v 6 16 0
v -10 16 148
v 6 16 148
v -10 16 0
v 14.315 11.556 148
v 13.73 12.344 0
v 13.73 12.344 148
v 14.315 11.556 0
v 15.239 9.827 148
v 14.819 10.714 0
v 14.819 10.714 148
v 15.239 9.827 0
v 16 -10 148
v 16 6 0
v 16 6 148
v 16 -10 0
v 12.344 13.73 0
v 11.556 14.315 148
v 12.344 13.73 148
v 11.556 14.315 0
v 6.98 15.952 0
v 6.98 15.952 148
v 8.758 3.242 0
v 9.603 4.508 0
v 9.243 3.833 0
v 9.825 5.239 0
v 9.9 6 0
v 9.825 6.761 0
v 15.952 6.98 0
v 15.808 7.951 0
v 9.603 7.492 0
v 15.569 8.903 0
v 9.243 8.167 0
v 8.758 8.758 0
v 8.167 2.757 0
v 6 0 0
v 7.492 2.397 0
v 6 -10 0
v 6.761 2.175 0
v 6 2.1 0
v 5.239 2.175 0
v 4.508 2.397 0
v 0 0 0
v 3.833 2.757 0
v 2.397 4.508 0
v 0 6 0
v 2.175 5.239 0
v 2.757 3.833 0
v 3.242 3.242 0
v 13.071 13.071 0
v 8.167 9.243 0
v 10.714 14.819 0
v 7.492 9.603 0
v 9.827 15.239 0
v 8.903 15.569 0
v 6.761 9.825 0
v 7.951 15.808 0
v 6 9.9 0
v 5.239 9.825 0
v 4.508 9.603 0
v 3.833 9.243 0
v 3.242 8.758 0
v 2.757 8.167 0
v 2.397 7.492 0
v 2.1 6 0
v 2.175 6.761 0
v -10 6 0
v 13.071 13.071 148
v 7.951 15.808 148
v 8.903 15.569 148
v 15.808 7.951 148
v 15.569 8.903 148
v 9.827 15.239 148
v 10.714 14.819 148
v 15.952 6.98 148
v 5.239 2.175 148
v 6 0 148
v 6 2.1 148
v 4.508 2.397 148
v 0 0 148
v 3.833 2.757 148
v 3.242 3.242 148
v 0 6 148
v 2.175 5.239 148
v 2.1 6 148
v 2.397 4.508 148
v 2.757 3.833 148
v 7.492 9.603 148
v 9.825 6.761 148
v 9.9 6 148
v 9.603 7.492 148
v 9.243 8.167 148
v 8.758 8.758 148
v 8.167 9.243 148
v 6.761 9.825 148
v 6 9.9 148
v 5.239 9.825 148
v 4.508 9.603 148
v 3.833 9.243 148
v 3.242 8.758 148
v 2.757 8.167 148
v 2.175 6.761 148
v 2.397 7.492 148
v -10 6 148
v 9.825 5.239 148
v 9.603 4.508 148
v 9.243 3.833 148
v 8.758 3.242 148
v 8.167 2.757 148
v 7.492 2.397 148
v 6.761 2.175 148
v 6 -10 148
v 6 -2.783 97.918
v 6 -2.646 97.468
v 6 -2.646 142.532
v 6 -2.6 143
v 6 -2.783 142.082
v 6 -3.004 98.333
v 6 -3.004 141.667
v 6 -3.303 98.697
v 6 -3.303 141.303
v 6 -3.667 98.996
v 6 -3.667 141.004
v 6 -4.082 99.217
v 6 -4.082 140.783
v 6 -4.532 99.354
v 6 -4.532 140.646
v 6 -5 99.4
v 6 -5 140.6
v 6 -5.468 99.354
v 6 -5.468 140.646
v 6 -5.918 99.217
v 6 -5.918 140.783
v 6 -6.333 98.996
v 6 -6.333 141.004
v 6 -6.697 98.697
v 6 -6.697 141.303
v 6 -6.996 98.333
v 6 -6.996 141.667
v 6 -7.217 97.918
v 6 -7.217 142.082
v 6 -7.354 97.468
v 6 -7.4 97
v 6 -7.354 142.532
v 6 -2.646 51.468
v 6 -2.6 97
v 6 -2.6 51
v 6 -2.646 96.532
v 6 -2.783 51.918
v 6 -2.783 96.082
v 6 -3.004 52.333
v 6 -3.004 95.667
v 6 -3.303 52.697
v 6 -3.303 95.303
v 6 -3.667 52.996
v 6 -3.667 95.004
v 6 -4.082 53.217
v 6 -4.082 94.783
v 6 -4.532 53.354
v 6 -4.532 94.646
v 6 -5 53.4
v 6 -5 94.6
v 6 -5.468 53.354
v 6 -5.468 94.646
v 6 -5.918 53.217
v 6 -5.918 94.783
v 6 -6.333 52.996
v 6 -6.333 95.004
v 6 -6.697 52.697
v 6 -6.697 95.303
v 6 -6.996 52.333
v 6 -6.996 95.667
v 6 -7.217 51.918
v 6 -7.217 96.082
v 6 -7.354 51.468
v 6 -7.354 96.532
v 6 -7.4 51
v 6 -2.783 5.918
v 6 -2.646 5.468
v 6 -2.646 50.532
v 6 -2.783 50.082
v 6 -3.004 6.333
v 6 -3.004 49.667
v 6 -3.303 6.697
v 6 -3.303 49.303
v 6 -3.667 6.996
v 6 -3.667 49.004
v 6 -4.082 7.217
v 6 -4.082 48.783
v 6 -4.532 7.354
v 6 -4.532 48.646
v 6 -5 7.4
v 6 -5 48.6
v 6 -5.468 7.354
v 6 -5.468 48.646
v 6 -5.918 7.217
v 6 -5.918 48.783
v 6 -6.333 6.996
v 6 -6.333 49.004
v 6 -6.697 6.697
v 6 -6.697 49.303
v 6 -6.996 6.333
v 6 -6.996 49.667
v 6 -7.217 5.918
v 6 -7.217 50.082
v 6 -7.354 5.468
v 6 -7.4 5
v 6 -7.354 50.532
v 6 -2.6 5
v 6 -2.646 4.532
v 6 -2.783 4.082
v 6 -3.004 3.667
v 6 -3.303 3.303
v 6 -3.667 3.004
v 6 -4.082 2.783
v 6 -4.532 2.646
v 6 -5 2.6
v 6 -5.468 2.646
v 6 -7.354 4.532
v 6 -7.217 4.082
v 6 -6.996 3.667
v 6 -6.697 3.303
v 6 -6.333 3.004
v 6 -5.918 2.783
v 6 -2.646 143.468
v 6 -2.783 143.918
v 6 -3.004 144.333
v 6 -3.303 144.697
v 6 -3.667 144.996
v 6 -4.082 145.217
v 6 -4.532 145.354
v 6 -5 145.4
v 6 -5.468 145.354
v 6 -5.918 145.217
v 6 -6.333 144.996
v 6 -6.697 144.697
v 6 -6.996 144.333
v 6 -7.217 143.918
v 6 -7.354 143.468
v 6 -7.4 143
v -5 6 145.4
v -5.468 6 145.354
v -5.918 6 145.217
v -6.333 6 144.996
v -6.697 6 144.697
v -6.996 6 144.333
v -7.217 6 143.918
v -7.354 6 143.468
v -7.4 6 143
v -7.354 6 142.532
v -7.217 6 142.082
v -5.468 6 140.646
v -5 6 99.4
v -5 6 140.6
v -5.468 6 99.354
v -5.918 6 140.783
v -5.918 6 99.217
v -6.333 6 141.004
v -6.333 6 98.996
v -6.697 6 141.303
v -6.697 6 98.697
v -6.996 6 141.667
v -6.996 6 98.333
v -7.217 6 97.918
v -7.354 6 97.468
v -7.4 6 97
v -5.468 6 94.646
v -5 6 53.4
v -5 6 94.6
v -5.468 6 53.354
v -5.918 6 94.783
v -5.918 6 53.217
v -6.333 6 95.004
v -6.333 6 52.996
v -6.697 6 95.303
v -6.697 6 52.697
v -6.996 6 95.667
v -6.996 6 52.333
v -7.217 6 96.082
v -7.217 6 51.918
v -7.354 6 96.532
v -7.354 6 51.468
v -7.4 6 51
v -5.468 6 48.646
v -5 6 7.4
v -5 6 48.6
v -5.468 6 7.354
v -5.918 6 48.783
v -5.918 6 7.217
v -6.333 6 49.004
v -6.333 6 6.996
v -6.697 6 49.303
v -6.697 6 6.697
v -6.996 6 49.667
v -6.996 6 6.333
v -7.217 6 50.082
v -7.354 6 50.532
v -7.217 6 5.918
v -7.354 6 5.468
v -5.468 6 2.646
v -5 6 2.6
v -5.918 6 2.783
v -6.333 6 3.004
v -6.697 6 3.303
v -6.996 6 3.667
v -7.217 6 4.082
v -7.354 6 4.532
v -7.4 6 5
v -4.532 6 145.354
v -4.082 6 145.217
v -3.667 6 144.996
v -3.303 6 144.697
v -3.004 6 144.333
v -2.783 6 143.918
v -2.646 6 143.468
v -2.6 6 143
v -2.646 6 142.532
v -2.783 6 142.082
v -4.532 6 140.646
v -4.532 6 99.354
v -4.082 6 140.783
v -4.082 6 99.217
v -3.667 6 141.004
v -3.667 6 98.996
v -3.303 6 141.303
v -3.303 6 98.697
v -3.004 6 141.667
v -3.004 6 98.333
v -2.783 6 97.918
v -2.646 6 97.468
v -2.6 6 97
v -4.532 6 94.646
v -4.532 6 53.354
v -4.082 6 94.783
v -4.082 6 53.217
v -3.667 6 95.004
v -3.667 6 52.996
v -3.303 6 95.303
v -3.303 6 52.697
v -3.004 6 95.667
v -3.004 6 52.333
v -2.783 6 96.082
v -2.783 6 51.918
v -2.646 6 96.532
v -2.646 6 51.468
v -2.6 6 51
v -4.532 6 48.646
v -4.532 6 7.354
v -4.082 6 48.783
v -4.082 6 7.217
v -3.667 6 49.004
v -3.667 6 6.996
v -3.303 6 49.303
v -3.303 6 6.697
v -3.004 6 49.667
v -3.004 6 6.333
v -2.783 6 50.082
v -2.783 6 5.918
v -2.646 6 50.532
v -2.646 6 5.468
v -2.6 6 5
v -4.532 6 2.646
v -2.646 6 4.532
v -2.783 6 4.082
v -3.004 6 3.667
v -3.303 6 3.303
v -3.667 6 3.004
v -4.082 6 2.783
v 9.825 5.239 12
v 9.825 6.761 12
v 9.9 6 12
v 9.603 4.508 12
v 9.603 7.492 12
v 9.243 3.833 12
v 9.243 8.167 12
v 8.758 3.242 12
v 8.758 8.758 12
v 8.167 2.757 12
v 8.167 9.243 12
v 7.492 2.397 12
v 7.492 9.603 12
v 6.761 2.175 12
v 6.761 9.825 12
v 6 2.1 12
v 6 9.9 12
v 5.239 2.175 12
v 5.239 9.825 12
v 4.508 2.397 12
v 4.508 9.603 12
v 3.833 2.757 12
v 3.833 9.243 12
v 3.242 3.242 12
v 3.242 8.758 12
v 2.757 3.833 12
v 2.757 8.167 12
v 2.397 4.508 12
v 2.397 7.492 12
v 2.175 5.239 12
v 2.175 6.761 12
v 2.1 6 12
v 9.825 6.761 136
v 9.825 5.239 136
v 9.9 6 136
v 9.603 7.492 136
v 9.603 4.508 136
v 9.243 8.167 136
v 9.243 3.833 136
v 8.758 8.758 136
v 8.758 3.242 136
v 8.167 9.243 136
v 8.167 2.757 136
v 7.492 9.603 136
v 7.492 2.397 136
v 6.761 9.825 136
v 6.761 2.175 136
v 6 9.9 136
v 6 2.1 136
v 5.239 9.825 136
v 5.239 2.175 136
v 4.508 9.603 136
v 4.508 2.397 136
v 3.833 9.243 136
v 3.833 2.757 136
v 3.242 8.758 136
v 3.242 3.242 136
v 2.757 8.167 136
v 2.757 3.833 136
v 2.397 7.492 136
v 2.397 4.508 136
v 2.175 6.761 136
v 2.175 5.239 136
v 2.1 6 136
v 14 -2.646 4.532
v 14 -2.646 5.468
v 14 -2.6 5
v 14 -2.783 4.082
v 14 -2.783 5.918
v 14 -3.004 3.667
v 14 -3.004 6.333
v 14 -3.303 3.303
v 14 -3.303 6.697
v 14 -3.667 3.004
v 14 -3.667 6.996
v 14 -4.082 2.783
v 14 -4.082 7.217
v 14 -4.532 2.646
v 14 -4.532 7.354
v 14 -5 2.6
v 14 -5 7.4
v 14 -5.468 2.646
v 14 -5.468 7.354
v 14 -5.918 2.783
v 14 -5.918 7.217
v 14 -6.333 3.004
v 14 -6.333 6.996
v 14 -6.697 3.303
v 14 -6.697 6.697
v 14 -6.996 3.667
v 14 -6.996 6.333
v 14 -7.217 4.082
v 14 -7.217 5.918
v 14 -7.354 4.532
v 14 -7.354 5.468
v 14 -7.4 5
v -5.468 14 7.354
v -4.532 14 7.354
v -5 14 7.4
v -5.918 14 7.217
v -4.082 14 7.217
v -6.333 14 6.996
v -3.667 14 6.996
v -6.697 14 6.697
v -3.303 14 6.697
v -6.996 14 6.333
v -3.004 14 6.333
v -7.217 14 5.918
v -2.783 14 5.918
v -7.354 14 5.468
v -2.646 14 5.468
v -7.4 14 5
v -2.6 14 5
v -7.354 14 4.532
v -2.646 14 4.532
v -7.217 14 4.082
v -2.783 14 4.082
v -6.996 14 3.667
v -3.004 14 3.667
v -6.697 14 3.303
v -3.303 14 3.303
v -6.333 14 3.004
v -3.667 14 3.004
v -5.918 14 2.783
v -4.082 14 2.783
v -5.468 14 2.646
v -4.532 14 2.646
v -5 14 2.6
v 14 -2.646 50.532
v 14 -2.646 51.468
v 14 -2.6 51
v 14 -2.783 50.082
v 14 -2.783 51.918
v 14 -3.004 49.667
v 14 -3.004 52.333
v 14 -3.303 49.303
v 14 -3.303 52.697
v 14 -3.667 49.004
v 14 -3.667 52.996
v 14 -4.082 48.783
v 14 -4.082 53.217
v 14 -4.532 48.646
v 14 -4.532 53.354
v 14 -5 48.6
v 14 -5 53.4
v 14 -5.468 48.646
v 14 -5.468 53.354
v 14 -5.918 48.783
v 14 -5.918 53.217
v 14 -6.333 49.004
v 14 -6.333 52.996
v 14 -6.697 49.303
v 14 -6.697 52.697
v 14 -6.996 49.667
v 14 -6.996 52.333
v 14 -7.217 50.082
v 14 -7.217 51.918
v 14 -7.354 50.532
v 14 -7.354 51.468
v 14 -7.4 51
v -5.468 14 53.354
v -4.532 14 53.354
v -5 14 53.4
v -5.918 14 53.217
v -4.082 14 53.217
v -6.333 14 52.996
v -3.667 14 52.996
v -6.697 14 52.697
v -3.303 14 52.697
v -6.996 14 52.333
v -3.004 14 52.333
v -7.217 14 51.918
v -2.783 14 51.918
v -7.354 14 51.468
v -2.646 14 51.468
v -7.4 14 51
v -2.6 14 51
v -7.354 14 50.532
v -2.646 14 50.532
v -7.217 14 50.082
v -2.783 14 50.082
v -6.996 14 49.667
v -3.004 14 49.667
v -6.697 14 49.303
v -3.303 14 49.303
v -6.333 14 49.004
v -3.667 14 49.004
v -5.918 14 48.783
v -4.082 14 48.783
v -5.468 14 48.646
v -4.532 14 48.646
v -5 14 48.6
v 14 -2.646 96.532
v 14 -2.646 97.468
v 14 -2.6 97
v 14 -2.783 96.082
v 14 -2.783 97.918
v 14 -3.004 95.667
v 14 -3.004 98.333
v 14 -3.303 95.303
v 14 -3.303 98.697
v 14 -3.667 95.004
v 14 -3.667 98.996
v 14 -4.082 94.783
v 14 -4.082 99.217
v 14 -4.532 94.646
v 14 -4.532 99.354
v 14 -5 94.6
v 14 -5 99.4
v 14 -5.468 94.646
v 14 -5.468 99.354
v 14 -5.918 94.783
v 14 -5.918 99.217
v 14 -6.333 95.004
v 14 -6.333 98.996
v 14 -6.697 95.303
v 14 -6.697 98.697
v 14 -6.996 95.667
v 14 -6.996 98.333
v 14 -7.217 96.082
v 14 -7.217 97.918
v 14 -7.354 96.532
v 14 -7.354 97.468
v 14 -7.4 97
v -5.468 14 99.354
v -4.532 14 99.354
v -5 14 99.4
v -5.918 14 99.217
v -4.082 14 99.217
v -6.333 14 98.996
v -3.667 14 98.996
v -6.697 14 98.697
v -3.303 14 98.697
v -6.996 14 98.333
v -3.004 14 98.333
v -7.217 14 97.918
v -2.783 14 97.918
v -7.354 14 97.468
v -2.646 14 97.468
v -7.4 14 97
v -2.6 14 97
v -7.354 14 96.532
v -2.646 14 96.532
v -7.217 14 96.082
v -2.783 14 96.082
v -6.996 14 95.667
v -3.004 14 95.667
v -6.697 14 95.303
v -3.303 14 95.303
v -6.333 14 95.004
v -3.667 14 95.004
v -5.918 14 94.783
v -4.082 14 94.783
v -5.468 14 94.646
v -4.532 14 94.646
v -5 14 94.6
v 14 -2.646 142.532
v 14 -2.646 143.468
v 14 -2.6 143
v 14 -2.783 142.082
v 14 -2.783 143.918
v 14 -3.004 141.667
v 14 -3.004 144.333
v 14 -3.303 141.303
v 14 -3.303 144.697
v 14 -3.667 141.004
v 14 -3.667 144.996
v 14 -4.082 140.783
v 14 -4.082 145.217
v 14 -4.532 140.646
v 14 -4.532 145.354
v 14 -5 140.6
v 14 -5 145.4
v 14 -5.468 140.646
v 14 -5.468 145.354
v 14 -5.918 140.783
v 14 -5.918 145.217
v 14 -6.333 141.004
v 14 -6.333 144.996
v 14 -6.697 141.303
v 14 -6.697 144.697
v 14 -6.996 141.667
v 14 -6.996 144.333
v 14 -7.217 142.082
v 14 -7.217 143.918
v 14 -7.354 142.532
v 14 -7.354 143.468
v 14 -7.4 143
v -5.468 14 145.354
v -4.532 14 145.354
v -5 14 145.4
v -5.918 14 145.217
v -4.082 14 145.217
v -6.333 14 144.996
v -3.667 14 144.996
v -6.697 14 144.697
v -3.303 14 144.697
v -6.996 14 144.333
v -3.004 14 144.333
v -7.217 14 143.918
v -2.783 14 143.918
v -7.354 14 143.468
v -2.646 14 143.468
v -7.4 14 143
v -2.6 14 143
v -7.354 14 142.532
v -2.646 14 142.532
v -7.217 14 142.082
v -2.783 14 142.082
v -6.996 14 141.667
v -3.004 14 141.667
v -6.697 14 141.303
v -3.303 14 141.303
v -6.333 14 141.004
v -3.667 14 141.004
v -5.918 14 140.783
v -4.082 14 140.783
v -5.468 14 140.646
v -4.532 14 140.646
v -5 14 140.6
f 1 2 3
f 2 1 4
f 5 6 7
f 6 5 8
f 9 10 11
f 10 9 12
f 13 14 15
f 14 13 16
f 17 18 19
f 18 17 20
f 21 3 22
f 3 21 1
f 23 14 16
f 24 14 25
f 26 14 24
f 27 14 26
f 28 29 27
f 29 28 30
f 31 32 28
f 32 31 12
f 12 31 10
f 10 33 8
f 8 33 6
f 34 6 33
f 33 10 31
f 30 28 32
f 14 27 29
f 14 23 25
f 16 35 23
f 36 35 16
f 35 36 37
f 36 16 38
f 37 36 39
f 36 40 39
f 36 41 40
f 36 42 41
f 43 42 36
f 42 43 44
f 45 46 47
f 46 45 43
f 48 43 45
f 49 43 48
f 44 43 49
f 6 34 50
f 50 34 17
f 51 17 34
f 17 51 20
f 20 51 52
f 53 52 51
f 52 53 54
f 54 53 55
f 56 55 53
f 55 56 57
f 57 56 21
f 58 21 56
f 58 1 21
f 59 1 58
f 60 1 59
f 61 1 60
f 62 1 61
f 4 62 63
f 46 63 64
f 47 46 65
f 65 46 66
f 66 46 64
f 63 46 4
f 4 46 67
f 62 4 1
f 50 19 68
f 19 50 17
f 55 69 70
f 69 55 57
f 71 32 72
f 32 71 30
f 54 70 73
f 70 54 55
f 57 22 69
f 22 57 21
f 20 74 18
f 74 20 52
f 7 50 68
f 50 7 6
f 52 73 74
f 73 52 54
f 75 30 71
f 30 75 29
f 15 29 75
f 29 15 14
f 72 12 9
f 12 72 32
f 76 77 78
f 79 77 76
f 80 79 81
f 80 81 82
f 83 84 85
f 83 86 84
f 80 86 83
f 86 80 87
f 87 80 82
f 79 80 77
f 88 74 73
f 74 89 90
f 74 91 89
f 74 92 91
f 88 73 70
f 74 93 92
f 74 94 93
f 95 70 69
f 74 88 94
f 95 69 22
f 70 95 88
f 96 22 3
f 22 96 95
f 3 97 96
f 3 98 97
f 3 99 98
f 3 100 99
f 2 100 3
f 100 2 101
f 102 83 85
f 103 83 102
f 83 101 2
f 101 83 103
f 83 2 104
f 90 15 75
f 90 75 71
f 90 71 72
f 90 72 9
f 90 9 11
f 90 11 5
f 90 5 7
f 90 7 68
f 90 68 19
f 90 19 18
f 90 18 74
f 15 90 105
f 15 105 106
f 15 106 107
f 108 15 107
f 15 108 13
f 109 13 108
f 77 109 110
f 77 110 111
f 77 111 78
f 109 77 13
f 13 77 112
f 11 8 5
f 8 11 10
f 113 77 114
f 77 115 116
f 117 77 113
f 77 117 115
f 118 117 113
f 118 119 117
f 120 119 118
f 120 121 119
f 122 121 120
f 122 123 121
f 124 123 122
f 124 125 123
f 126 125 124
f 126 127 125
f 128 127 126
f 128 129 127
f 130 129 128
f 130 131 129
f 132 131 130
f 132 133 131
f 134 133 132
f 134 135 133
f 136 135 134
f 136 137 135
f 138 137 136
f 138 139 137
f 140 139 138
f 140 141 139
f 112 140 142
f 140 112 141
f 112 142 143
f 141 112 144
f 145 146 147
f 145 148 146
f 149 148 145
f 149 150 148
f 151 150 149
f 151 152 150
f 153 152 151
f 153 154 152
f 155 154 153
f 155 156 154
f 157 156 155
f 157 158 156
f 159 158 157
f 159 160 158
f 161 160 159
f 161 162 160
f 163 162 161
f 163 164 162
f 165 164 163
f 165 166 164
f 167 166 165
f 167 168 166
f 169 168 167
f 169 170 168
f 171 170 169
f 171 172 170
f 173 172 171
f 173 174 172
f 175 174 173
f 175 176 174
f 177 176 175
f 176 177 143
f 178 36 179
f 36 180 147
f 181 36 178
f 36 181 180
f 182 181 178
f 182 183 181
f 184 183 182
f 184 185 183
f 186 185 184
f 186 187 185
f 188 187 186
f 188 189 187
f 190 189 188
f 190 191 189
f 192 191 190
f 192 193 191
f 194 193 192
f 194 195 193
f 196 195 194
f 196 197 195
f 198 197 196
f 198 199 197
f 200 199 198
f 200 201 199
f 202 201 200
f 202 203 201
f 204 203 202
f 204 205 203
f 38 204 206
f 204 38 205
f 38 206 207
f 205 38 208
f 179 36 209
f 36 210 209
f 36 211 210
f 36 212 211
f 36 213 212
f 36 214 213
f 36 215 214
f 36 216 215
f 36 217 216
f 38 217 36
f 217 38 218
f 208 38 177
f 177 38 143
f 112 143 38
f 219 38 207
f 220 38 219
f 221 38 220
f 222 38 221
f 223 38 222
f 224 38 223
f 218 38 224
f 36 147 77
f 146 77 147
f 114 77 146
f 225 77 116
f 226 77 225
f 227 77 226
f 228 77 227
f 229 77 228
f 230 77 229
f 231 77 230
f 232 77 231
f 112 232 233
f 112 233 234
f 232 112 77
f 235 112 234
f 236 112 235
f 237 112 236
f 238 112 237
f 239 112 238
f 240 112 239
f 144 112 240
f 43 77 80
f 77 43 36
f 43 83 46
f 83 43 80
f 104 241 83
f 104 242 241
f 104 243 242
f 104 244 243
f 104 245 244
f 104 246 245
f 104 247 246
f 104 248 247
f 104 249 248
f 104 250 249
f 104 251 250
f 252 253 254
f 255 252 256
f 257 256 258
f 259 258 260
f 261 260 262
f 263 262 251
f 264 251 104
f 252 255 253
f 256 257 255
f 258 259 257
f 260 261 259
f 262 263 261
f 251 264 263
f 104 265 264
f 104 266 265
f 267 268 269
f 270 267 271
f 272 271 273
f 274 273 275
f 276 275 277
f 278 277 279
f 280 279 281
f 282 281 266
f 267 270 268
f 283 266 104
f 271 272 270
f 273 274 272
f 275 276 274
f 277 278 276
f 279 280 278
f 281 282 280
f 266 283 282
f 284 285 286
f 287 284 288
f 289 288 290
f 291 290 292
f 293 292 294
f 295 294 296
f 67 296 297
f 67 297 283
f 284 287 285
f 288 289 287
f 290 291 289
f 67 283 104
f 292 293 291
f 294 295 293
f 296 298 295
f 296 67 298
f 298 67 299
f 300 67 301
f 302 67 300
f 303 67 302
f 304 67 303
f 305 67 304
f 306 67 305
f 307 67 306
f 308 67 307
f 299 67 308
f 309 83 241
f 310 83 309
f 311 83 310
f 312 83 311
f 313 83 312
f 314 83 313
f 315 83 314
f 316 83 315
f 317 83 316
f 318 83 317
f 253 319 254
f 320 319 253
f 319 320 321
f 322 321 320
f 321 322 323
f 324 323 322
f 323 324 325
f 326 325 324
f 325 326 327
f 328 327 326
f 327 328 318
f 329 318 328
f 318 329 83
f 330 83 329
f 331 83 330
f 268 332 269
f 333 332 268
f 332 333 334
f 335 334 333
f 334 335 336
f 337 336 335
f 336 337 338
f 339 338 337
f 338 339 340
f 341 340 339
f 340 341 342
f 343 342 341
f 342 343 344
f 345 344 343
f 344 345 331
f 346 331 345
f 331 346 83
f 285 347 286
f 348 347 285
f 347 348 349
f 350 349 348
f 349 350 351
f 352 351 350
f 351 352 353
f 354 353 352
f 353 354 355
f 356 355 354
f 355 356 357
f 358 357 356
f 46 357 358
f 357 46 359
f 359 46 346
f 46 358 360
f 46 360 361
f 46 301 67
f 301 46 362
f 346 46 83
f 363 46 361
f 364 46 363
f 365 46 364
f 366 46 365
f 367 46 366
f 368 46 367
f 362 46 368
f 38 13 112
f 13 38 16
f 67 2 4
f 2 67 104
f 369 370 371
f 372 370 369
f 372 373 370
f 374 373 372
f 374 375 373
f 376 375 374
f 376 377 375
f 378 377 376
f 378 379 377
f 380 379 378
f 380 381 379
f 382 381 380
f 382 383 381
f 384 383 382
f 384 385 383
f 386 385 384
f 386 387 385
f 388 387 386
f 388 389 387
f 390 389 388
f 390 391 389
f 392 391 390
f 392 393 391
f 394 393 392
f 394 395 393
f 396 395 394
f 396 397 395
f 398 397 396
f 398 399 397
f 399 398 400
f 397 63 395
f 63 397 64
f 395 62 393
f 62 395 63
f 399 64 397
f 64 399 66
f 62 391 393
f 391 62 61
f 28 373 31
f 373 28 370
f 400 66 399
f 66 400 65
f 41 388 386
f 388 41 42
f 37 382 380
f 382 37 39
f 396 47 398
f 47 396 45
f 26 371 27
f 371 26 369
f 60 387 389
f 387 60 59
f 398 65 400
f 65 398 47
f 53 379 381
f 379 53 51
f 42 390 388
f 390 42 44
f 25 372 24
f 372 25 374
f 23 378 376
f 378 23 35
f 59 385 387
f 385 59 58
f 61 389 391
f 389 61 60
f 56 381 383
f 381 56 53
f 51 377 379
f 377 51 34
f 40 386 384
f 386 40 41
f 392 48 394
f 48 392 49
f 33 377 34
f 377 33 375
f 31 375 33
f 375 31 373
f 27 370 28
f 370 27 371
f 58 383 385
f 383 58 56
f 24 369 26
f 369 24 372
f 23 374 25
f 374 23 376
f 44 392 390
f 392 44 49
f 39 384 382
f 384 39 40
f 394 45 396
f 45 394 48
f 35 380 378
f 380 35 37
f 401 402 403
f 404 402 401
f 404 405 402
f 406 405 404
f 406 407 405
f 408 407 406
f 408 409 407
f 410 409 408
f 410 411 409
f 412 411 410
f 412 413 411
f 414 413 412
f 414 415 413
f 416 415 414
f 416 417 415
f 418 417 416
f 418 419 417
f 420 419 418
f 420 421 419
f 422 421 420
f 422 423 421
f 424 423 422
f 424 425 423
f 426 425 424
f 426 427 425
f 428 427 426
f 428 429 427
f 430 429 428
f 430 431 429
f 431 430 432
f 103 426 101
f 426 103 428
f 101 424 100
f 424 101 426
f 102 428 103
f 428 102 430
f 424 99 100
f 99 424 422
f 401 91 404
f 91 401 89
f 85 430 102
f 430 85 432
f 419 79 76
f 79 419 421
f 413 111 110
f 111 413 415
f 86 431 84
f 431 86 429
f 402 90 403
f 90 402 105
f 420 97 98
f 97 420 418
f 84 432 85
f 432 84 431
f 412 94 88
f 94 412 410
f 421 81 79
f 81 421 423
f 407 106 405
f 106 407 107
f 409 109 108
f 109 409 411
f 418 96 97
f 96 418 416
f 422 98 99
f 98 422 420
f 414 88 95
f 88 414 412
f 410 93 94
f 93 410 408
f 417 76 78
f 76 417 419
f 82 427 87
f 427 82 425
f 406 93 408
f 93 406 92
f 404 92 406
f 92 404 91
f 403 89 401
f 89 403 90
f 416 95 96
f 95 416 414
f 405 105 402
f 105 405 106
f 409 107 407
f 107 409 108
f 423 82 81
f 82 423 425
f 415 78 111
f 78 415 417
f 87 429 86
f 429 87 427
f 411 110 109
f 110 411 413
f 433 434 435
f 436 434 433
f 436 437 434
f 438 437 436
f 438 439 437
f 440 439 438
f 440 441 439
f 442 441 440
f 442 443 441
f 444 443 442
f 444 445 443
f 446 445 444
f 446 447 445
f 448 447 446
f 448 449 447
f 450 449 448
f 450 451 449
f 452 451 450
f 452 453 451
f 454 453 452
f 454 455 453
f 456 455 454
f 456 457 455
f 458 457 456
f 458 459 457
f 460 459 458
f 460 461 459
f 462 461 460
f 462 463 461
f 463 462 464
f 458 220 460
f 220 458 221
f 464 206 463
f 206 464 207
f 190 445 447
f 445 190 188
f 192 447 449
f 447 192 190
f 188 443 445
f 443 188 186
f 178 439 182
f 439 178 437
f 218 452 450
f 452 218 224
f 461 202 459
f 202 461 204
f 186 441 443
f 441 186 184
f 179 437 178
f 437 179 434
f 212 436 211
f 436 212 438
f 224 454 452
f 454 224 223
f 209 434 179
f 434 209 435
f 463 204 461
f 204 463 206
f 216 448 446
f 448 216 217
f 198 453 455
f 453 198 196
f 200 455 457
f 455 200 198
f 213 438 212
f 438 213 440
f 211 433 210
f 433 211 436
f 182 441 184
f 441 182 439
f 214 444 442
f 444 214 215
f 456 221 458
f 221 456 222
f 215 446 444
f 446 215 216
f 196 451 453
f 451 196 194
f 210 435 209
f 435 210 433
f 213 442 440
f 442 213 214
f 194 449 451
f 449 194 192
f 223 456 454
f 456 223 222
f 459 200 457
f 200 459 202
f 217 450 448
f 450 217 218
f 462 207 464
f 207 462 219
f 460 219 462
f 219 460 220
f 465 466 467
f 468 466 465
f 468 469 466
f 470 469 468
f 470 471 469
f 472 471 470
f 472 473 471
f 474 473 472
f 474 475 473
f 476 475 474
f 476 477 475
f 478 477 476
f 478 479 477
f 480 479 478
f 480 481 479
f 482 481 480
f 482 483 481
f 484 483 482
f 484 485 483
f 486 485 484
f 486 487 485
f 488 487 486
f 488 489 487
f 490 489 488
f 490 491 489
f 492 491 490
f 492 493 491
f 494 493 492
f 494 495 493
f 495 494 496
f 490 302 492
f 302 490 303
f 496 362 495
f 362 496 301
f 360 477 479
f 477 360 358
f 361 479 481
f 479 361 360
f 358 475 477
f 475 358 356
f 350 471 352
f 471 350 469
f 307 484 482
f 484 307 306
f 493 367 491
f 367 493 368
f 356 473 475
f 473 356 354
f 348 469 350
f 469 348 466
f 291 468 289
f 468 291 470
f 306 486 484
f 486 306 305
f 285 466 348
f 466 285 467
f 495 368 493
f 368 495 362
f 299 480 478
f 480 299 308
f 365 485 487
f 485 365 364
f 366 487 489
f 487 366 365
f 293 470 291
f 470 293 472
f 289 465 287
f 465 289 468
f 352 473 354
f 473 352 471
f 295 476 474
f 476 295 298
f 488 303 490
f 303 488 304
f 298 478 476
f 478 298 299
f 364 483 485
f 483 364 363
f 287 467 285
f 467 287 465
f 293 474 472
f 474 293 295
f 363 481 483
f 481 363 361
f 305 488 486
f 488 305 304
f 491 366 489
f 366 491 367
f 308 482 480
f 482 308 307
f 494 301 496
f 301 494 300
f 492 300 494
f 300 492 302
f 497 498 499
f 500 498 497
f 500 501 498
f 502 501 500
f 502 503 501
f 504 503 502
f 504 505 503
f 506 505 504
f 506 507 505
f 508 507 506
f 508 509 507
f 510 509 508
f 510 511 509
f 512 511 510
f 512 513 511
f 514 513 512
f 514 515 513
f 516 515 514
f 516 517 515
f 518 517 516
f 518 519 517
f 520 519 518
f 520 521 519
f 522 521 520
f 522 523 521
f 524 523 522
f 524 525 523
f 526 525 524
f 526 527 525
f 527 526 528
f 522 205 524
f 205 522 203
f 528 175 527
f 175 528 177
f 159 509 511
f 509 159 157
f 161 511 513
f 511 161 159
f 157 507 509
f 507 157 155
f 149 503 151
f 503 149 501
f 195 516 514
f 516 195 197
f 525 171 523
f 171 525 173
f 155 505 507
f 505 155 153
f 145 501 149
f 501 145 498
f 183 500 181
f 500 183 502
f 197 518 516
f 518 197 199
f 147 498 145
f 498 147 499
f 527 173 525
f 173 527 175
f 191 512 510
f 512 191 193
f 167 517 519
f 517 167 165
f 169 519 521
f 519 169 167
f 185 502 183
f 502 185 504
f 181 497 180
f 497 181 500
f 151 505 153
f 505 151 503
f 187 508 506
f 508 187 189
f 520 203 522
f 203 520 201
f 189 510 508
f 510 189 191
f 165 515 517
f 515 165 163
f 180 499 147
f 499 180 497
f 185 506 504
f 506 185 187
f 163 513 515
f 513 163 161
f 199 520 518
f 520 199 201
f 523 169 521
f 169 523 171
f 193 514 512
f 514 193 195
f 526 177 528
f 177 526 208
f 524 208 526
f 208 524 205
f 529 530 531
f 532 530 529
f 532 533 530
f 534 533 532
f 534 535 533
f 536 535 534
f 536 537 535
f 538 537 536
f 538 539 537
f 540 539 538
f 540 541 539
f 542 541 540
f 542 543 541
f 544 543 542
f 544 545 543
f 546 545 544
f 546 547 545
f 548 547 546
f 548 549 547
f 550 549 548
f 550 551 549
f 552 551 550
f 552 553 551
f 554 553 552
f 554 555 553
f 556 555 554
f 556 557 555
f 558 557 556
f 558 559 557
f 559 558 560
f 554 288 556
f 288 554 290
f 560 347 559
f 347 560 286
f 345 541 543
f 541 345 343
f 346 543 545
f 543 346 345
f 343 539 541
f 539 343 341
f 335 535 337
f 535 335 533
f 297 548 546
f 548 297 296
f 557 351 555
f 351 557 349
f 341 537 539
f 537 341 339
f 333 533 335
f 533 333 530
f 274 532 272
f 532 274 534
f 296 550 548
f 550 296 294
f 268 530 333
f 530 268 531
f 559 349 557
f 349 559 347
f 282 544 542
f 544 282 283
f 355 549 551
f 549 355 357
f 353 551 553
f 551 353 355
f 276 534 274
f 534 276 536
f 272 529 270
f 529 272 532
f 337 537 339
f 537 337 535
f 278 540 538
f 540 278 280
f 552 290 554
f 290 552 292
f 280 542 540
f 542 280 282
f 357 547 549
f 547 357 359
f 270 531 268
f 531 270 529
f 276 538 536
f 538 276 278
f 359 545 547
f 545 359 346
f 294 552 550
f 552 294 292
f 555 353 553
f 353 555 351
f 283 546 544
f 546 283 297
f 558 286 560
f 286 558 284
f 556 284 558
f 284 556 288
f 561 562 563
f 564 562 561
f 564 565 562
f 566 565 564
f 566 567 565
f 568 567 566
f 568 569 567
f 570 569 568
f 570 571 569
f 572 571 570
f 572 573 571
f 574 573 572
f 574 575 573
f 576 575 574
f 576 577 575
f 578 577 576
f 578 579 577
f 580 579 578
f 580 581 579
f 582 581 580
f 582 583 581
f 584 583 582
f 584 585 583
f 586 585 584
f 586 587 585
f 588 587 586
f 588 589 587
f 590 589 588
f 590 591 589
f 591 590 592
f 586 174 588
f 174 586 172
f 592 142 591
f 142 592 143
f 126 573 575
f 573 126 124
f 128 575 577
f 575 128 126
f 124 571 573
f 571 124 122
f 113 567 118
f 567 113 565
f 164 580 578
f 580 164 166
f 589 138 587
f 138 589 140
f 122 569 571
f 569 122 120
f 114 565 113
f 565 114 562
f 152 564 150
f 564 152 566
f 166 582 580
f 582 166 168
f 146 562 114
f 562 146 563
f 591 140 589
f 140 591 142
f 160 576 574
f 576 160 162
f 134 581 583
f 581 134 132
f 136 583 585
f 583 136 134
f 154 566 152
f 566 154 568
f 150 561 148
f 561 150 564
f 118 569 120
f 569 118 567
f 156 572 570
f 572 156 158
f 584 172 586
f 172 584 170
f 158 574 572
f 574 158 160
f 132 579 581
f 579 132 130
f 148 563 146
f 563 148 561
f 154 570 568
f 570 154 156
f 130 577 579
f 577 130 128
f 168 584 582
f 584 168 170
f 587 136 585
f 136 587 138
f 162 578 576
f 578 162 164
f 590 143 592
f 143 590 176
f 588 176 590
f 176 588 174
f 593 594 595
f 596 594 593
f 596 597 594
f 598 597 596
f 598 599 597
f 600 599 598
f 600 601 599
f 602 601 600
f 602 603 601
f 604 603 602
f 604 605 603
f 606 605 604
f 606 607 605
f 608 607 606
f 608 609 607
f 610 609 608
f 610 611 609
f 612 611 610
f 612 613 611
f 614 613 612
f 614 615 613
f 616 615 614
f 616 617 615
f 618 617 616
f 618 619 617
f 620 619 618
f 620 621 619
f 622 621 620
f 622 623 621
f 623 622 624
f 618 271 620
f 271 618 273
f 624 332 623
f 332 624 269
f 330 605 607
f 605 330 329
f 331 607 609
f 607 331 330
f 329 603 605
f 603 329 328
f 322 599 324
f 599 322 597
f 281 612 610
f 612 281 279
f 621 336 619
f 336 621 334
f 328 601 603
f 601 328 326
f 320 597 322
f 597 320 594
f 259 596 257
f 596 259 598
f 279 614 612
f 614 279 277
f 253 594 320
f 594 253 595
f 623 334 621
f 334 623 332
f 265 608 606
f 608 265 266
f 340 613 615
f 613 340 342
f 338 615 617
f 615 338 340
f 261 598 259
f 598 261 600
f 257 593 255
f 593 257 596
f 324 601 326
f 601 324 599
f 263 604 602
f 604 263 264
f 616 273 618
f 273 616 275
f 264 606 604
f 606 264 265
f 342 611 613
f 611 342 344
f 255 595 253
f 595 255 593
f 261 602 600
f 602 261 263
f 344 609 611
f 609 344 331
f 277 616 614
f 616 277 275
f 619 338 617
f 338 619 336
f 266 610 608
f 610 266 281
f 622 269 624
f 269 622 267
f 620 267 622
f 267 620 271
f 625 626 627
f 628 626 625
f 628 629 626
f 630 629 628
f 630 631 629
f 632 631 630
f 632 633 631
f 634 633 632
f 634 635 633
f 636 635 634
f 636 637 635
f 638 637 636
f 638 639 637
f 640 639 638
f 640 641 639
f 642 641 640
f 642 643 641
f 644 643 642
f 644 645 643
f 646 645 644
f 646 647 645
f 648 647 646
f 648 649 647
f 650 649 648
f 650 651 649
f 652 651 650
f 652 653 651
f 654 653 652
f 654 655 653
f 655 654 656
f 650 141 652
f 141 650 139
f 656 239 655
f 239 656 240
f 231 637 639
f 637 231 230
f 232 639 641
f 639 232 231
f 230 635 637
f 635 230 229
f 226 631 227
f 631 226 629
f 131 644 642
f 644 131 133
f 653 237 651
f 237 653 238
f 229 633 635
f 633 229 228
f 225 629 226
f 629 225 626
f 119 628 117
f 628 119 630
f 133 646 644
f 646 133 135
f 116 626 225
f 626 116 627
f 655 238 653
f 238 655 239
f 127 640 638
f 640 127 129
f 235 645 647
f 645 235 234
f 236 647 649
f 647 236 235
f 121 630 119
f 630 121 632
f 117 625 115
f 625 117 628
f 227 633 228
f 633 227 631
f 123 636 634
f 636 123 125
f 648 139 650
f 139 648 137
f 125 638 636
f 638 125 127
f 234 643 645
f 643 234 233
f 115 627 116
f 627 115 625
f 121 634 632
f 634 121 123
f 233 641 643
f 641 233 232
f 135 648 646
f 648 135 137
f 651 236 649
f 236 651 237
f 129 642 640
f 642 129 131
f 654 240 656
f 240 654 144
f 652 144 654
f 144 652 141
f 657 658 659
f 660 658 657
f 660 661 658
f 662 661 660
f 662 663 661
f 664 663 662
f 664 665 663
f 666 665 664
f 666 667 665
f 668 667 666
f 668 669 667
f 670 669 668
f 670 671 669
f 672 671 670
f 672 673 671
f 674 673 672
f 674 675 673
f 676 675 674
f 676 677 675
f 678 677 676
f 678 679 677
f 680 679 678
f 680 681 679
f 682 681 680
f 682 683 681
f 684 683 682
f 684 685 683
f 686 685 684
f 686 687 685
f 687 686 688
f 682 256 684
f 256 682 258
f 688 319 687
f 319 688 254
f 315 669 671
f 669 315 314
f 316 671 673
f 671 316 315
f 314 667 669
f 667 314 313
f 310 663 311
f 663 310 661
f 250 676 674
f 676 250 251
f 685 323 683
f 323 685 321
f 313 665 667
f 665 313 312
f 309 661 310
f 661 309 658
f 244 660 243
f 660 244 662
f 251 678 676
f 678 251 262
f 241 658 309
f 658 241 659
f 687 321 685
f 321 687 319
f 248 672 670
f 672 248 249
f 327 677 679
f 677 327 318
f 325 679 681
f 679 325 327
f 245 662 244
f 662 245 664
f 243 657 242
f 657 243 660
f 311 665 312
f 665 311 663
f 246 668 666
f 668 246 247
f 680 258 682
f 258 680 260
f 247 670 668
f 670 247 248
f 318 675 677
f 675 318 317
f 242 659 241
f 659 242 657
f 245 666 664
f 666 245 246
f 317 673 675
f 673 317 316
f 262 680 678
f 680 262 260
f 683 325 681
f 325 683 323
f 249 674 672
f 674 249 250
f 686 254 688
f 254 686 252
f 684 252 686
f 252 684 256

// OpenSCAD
// file: ../source/pci.scad
use <zcube.scad>;

function inch(x) = x * 25.4;

module pci_card() {
	// We translate the gtx card to the correct datum:
	//-7 + 3.65/2 + 8.25 - 4.85 - 7.25
	translate([1.6/2, 8/2 + 3.65 + 12.15, 3.1-8.25-3.85]) rotate([90, 0, -90]) import("gtx.stl", convexity=4);
}

module pci_connectors(inset = inch(-0.6), offset = inch(1.2), factor = 0.5, index = 0, count = 4) {
	// This is the position of pin 0 is given when factor is 0, otherwise when factor = 0.5 it's the midpoints.
	translate([-offset, inset, 0]) {
		for (x = [index:1:count-1])
			translate([inch(0.8*(x+factor)), 0, 0]) children();
	}
}

module pci_express_datum(offset = 3.85+16.15, index = 0, count = 4) {
	pci_connectors(inset = -46.94, offset = 13.67, index = index, count = count, factor = 0)
	translate([0, 0, offset]) children();
}

module pci_express_connector(length = 89.0) {
	translate([0, -length/2+14.5, 0]) zcube([7.5, length, 11.25]);
}

module pci_express_connectors() {
	pci_express_datum(0, index = 0, count = 4) pci_express_connector();
}
// file: ../source/fan.scad
use <bolts.scad>;
use <zcube.scad>;

module fan(diameter = 140, thickness = 25) {
	translate([-diameter/2, -diameter/2, -thickness]) color("blue") cube([diameter, diameter, thickness]);
}

module fan_holes(diameter = 140, spacing = 124.5, z = 10) {
	outset = spacing / 2;
	
	translate([outset, outset, z]) children();
	translate([-outset, outset, z]) children();
	translate([-outset, -outset, z]) children();
	translate([outset, -outset, z]) children();
}

module fan_cutout(diameter = 140, thickness = 6, inset = 4, spacing = 124.5) {
	render() {
		translate([0, 0, -0.1]) cylinder(h = thickness+0.2, r = (diameter - inset)/2);
		
		/* translate([0, 0, wall]) zcorners() hull() {
			translate([-spacing/2, -spacing/2, 0]) cylinder_outer(thickness-wall+0.1, (diameter-spacing)/2);
			cylinder_outer(thickness-wall+0.1, diameter/5);
		} */
		
		// The screw is M3, but we make the hole M4 so it won't hold a thread.
		fan_holes(diameter, spacing) translate([0, 0, -35]) hole(4, 35);
	}
}

//color("brown") fan();
//#fan_holes() translate([0, 0, -35]) hole(3, 35);
fan_cutout(80, spacing=80-10);
// file: ../source/ssd.scad
use <bolts.scad>;
use <zcube.scad>;

ssd_dimensions = [70, 100, 7];

module ssd(dimensions = ssd_dimensions) {
	color("silver") translate([0, -dimensions[1]/2, 0]) difference() {
		translate([-dimensions[0]/2, 0, 0]) cube(dimensions);
		
		// This is just an approximation for visual alignment.
		translate([-dimensions[0]/2 + dimensions[0]/6, -0.01, -0.01]) cube([dimensions[0]*0.5, dimensions[1]*0.1, dimensions[2]*0.8]);
		
		ssd_holes_bottom() translate([0, 0, -3]) hole(3, 6+3);
		ssd_holes_side() translate([0, 0, -3]) hole(3, 6+3);
	}
}

module ssd_holes_bottom(dimensions = ssd_dimensions, width = 61.71, inset = [14, 90.6]) {
	mirror([0, 0, 1]) {
		translate([-width/2, inset[0], 0]) children();
		translate([width/2, inset[0], 0]) children();
		
		translate([-width/2, inset[1], 0]) children();
		translate([width/2, inset[1], 0]) children();
	}
}

module ssd_holes_side(dimensions = ssd_dimensions, offset = 3, inset = [14, 90.6]) {
	translate([0, 0, offset]) {
		translate([dimensions[0]/2, inset[0], 0]) rotate([0, 90, 0]) children();
		translate([dimensions[0]/2, inset[1], 0]) rotate([0, 90, 0]) children();
		
		mirror([1, 0, 0]) {
			translate([dimensions[0]/2, inset[0], 0]) rotate([0, 90, 0]) children();
			translate([dimensions[0]/2, inset[1], 0]) rotate([0, 90, 0]) children();
		}
	}
}

module ssd_cutout(dimensions = ssd_dimensions, depth=6) {
	translate([0, -dimensions[1]/2, 0]) {
		// The screw is M3, but we make the hole M4 so it won't hold a thread.
		ssd_holes_bottom() translate([0, 0, -3]) hole(4, depth+3);
	}
}

ssd();
// file: ../source/bay.scad
use <bolts.scad>;
use <zcube.scad>;

bay_dimensions = [102, 100, 25];

module bay(dimensions = bay_dimensions) {
	difference() {
		// http://silverstonetek.com/goods_cable_define/sx500-g-cable-define.pdf
		color("grey") translate([-dimensions[0]/2, 0, -dimensions[2]]) cube(dimensions);
		bay_holes() rotate(90, [1, 0, 0]) hole(3, 10);
	}
}

module bay_holes(outset = 6, dimensions = bay_dimensions) {
	width = dimensions[0];
	height = dimensions[2];
	
	translate([-width/2-outset, 0, -height/2]) children();
	translate([width/2+outset, 0, -height/2]) children();
}

module bay_cutout(thickness = 10, inset = 12, dimensions = bay_dimensions) {
	color("grey") translate([0, 0.1, -dimensions[2]/2]) rotate([90, 0, 0]) zcube([dimensions[0], dimensions[2], thickness+0.2]);
	
	// The screw is M3, but we make the hole M4 so it won't hold a thread.
	bay_holes() translate([0, 30-thickness, 0]) rotate([90, 0, 0]) hole(4, 30);
}

module bay_offset(x = 0, y = 0.5, dimensions = bay_dimensions) {
	translate([dimensions[0]*x, 0, dimensions[2]*y]) children();
}

bay_offset() {
	bay();
	color("red") bay_cutout();
}
// file: ../source/sfx.scad
use <bolts.scad>;
use <zcube.scad>;

sfx_dimensions = [125, 100, 63.5];

module sfx(dimensions = sfx_dimensions) {
	difference() {
		// http://silverstonetek.com/goods_cable_define/sx500-g-cable-define.pdf
		color("grey") translate([-dimensions[0]/2, 0, -dimensions[2]]) cube(dimensions);
		sfx_holes() rotate(90, [1, 0, 0]) hole(3, 10);
	}
}

module sfx_holes(inset = 6, dimensions = sfx_dimensions) {
	width = dimensions[0];
	height = dimensions[2];
	
	translate([-width/2+inset, 0, -inset]) children();
	translate([width/2-inset, 0, -inset]) children();
	
	// TODO I don't know if this is correct..
	translate([-width/2+inset, 0, -height/2]) children();
	translate([width/2-inset, 0, -height/2]) children();
	
	translate([-width/2+inset, 0, inset-height]) children();
	translate([width/2-inset, 0, inset-height]) children();
}

module sfx_cutout(thickness = 10, inset = 12, dimensions = sfx_dimensions) {
	difference() {
		color("grey") translate([0, 0.1, -dimensions[2]/2]) rotate([90, 0, 0]) zcube([dimensions[0]-inset, dimensions[2]-inset, thickness+0.2]);

		sfx_holes() rotate([90, 45, 0]) zcube([inset, inset, thickness*2], z=-thickness/2);
	}
	
	// The screw is M3, but we make the hole M4 so it won't hold a thread.
	sfx_holes() translate([0, 30-thickness, 0]) rotate([90, 0, 0]) hole(4, 30);
}

module sfx_offset(x = 0, y = 0.5, dimensions = sfx_dimensions) {
	translate([dimensions[0]*x, 0, dimensions[2]*y]) children();
}

sfx_offset() {
	sfx();
	color("red") sfx_cutout();
}
// file: ../source/h115i.scad
use <bolts.scad>;

use <fan.scad>;

module h115i(diameter = 140, spacing = 124.5, offset = 20, radiator = [29, 315, 143]) {
	outset = (diameter - spacing) / 2;
	dy = (offset / 2) - outset;
	
	// Corsair H115i
	// Radiator dimensions: 140mm x 312mm x 26mm
	// Fan dimensions: 140mm x 25mm
	difference() {
		union() {
			color("white") translate([-(radiator[0]+25), -radiator[1]/2, -radiator[2]/2]) cube(radiator);
			
			translate([0, -70-dy, 0]) rotate([0, 90, 0]) fan();
			translate([0, 70+dy, 0]) rotate([0, 90, 0]) fan();
		}
		
		h115i_cutout();
	}
}

module h115i_cutout(diameter = 140, spacing = 124.5, offset = 20) {
	outset = (diameter - spacing) / 2;
	dy = (offset / 2) - outset;
	
	translate([0, -70-dy, 0]) rotate([0, 90, 0]) fan_cutout();
	translate([0, 70+dy, 0]) rotate([0, 90, 0]) fan_cutout();
}

h115i();
color("red") h115i_cutout();
// file: ../source/zcube.scad
// This function creates a cube with a given x/y either above (f=1) or below (f=-1) the z axis.
module zcube(dimensions, z=0, f=1) {
	translate([0, 0, dimensions[2]/2 * f + z]) cube(dimensions, true);
}

module rcube(dimensions, d, z=0, f=1) {
	dx = dimensions[0]/2 - d/2;
	dy = dimensions[1]/2 - d/2;
	dz = dimensions[2]/2 * (f-1) + z;
	
	hull() {
		translate([-dx, -dy, dz]) cylinder(h=dimensions[2], d=d);
		translate([-dx, dy, dz]) cylinder(h=dimensions[2], d=d);
		translate([dx, -dy, dz]) cylinder(h=dimensions[2], d=d);
		translate([dx, dy, dz]) cylinder(h=dimensions[2], d=d);
	}
}

module zcorners() {
	children();
	mirror([1, 0, 0]) children();
	mirror([0, 1, 0]) children();
	mirror([1, 1, 0]) children();
}

module reflect(axis = [1, 0, 0]) {
	children();
	mirror(axis) children();
}

module zsides(dimensions, thickness) {
	reflect([1, 0, 0]) {
		translate([thickness/2+dimensions[0]/2, 0, dimensions[2]/2]) cube([thickness, dimensions[1], dimensions[2]], true);
	}
	
	reflect([0, 1, 0]) {
		translate([0, thickness/2+dimensions[1]/2, dimensions[2]/2]) cube([dimensions[0], thickness, dimensions[2]], true);
	}
}
// file: ../source/bolts.scad
$radial_error = 0.1;
$fn = 4*8;

module cylinder_outer(height, radius, fn=$fn, radial_error=$radial_error) {
	fudge = 1/cos(180/fn);
	cylinder(h=height,r=radius*fudge+$radial_error, $fn=fn);
}

module cylinder_inner(height, radius, fn=$fn) {
	cylinder(h=height,r=radius-$radial_error,$fn=fn);
}

// Make a hole. The diameter is the size of the screw (e.g. 3 for M3). Depth is how far the hole should go for the thread, and inset is how far out there should be a hole for the head to go.
module hole(diameter=3, depth=6, inset=10) {
	cylinder_outer(depth, diameter/2);
	translate([0, 0, depth]) cylinder_outer(inset, diameter, 32);
}

module countersunk_hole(diameter=3, depth=6, inset=10) {
	hole(diameter, depth, inset);
	translate([0, 0, depth-diameter/2]) cylinder(r1=diameter/2+$radial_error, r2=diameter+$radial_error, h=diameter/2);
}

module threaded_countersunk_hole(diameter=3, depth=6, inset=10) {
	hole(diameter*0.9, depth, inset);
	translate([0, 0, depth-diameter/2]) cylinder(r1=diameter/2+$radial_error, r2=diameter+$radial_error, h=diameter/2);
}

module knurled_insert(diameter = 3, depth = 6, thickness = 1) {
	cylinder_inner(depth, diameter/2 + thickness);
}

module knurled_hole(diameter = 3, depth = 6, inset = 10, insert = 4, thickness = 1) {
	hole(diameter, depth, inset);
	
	knurled_insert(diameter, insert, thickness);
}

module countersunk_knurled_hole(diameter = 3, depth = 6, inset = 10, insert = 4, thickness = 1) {
	countersunk_hole(diameter, depth, inset);
	
	knurled_insert(diameter, insert, thickness);
}

// Make a hole for a bolt/screw combination.
module bolted_hole(diameter=3, depth=8, nut_offset=2, shaft_length=10, inset=10) {
	hole(diameter, depth, inset);
	hull() {
		shaft_width = diameter;
		translate([0, 0, nut_offset]) rotate(360/12, [0, 0, 1]) cylinder_outer(diameter, shaft_width, 6);
		translate([0, shaft_length, nut_offset]) rotate(360/12, [0, 0, 1]) cylinder_outer(diameter, shaft_width, 6);
	}
}

module countersunk_bolted_hole(diameter=3, depth=8, nut_offset=2, shaft_length=10, inset=10) {
	countersunk_hole(diameter, depth, inset);
	hull() {
		shaft_width = diameter;
		translate([0, 0, nut_offset]) rotate(360/12, [0, 0, 1]) cylinder_outer(diameter, shaft_width, 6);
		translate([0, shaft_length, nut_offset]) rotate(360/12, [0, 0, 1]) cylinder_outer(diameter, shaft_width, 6);
	}
}

module mounting_hole(diameter=3, depth=6, inset=10, outset=3) {
	difference() {
		cylinder_outer(depth, diameter/2+outset);
		hole(diameter=diameter, depth=depth, inset=inset);
	}
}

render() rotate(90, [1, 0, 0]) difference() {
	cube([40, 10, 10]);
	translate([5, 5, 0]) bolted_hole(diameter=3, depth=8);
	translate([15, 5, 0]) bolted_hole(diameter=4, depth=8);
	translate([25, 5, 0]) countersunk_hole(diameter=4, depth=8);
	translate([35, 5, 0]) knurled_hole();
}
// main file
include <../source/case.scad>;

render() 
translate([-internal_size[0]/2, -internal_size[0]/2, 0])
difference() {
	corner();
	corner_cutout();
}
